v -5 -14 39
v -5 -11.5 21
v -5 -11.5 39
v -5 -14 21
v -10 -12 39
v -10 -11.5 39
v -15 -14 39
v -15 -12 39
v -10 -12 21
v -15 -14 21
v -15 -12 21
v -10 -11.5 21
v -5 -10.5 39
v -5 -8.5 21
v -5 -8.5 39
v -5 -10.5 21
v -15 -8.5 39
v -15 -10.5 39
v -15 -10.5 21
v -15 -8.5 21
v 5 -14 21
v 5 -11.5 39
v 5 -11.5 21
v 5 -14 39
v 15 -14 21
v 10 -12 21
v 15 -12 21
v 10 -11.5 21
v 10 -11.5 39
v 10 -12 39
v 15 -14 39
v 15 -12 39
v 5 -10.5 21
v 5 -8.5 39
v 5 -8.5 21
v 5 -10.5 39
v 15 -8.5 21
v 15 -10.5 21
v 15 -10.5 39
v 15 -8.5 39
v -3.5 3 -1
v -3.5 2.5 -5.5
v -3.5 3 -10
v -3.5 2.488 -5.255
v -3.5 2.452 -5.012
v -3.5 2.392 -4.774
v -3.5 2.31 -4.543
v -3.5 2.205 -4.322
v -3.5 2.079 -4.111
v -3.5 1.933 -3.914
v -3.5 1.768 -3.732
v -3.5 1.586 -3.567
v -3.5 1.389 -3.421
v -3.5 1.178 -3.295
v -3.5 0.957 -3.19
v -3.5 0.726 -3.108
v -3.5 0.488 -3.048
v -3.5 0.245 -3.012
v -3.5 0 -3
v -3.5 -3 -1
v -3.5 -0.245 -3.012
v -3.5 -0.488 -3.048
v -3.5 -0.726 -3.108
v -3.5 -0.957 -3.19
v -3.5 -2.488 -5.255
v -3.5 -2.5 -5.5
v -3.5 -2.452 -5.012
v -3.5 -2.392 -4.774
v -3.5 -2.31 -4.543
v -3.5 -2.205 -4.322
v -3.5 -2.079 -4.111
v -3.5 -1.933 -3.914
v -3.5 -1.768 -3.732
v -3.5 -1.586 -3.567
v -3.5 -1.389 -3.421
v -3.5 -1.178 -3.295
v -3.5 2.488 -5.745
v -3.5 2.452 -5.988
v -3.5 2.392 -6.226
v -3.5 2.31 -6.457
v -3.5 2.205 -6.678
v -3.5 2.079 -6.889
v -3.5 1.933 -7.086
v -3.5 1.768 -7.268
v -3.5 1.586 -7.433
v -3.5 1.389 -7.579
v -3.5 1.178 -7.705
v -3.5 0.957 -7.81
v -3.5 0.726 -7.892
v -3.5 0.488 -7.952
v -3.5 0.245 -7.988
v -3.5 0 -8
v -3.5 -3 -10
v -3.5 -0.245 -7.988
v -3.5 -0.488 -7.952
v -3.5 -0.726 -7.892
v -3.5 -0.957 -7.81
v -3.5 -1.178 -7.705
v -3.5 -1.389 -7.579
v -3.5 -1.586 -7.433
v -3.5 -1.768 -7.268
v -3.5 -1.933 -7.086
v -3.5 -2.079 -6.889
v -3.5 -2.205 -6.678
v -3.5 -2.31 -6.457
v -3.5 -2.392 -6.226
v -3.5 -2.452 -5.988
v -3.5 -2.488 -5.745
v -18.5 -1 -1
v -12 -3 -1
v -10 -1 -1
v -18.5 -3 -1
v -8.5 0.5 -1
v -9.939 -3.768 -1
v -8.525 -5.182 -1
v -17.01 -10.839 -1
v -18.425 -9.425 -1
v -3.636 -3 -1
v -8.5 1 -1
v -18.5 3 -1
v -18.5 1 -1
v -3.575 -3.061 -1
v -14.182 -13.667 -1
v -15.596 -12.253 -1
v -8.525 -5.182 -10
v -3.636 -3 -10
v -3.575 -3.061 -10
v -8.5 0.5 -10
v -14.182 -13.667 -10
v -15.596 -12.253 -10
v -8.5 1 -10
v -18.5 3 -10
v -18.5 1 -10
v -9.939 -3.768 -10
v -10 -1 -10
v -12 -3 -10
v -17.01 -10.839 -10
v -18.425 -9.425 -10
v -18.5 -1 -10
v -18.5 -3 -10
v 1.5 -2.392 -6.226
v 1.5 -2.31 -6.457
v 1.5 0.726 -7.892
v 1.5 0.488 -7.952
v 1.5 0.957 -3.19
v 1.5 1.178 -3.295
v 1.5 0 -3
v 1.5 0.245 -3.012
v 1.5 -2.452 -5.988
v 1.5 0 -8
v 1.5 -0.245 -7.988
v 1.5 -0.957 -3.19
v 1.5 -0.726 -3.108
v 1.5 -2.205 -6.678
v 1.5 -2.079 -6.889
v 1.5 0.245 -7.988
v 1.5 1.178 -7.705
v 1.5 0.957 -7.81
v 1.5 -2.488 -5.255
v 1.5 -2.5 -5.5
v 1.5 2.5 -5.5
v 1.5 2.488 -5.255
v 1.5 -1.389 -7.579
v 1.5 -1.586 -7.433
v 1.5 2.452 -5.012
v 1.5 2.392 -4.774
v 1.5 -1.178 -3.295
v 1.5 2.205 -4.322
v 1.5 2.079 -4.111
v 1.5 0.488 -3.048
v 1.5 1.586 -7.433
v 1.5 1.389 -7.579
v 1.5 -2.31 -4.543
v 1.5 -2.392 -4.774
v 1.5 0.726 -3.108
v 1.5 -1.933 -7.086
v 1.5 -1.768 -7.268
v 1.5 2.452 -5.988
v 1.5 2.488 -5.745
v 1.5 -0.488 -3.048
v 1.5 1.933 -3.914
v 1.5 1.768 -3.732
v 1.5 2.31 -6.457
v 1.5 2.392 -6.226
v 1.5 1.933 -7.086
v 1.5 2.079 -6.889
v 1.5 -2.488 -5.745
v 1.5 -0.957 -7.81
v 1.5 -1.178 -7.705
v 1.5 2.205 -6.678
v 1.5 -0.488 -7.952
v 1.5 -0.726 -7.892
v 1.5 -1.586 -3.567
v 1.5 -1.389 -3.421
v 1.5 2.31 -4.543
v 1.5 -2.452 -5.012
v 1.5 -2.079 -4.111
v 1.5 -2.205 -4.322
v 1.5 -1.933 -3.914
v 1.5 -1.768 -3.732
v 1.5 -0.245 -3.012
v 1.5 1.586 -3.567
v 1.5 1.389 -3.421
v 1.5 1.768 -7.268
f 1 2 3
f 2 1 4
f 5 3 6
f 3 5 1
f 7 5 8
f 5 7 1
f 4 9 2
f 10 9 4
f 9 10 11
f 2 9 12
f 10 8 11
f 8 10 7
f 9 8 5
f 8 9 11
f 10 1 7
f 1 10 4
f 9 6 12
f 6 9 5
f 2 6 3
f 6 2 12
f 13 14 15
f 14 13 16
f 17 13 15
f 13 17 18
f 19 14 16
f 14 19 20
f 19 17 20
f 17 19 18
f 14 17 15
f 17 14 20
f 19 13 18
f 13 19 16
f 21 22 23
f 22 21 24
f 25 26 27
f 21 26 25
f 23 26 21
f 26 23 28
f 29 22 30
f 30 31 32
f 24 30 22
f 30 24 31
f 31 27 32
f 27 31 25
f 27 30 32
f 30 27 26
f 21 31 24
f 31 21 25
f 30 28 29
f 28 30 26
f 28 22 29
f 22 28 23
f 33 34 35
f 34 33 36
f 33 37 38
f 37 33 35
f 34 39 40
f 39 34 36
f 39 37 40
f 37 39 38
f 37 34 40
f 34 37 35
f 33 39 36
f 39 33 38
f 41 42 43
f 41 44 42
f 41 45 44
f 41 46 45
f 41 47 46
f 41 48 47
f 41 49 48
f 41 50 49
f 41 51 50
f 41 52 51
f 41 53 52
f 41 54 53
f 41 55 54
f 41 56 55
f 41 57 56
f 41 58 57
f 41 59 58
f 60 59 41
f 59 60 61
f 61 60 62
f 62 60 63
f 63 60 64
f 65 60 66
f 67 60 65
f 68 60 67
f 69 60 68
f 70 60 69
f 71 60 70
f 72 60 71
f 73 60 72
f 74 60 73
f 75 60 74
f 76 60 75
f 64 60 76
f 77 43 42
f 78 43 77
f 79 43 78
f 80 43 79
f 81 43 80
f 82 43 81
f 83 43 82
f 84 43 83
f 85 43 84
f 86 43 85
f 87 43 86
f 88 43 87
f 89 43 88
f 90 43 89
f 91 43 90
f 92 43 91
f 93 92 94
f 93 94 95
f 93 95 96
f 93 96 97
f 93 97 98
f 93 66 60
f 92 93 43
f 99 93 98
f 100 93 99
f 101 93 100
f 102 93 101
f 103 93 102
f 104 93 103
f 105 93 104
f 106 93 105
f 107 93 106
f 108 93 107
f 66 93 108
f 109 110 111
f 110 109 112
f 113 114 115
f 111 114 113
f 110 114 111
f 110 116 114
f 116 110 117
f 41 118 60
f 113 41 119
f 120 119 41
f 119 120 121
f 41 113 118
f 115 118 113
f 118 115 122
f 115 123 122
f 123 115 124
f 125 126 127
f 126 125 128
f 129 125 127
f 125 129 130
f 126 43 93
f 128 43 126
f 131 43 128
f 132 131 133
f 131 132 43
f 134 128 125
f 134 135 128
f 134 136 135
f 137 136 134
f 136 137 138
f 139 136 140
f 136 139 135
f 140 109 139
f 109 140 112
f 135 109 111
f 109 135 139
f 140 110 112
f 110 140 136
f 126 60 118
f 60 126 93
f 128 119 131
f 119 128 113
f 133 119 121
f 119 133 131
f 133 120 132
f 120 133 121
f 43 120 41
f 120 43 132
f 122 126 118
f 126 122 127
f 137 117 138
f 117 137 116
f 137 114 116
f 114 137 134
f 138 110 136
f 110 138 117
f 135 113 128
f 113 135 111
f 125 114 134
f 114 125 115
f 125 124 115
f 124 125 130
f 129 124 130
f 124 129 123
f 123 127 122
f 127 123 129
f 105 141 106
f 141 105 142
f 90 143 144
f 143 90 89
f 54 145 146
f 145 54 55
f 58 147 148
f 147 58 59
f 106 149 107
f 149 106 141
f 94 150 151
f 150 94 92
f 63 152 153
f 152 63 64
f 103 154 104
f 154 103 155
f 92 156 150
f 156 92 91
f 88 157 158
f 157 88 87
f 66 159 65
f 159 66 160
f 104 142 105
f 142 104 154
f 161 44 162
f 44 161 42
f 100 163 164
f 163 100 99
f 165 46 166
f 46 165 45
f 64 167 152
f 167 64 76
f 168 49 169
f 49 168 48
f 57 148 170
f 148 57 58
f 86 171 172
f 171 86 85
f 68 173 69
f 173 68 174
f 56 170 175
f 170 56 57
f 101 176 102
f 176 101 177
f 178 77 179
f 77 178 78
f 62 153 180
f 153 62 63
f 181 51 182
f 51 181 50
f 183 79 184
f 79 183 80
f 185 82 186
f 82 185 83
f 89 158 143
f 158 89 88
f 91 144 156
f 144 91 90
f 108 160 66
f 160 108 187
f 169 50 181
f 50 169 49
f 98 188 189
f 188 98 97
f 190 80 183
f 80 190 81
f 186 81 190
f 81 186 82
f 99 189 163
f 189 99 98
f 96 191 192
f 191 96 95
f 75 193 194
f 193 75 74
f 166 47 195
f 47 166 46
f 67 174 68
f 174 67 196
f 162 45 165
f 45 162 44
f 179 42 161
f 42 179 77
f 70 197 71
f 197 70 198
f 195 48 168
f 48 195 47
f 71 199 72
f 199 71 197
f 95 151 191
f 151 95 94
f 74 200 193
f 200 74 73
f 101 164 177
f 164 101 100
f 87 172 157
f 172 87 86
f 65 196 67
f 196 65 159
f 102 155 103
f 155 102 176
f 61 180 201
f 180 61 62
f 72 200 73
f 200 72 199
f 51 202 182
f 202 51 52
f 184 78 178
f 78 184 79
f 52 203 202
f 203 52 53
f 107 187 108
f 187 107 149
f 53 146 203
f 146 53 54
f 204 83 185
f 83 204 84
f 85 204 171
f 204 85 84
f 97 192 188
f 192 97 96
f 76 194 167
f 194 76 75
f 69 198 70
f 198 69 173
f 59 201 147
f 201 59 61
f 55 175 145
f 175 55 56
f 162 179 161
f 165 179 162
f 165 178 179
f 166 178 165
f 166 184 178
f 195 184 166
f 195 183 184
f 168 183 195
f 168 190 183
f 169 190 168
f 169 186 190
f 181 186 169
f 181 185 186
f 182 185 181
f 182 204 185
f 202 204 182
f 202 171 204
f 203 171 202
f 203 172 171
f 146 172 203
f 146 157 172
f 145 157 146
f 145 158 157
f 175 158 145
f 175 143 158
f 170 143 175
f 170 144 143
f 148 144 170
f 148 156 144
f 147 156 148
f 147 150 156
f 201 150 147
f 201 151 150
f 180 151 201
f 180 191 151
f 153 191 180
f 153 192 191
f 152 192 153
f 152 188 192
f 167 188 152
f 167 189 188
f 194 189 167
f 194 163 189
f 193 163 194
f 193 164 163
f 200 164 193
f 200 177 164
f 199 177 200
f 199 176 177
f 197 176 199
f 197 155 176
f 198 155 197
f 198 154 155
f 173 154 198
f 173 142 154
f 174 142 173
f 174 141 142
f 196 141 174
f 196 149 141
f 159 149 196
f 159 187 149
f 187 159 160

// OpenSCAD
//difference(){
$fn = 64;


translate([-10,-13,30]) {
            rotate([0, 0, 0]){
                cube([10,2,18], true);
                translate([2.5,1,0]) cube([5,1,18], true);
                translate([0,3.5,0]) cube([10,2,18], true);
            }
        }
        
        translate([10,-13,30]) {
            rotate([0, 180, 0]){
                cube([10,2,18], true);
                translate([2.5,1,0]) cube([5,1,18], true);
                translate([0,3.5,0]) cube([10,2,18], true);
            }
        }



translate([-11,-2,-5.5]){
    translate([0, 0, 0]) {
        cube([15,2,9], true);
        translate([5,2,0]) cube([5,2,9], true);
        translate([0,4,0]) cube([15,,2,9], true);
    }
    
    rotate([180, 0, 45]) translate([-3, 1, 0]) {
        cube([15,2,9], true);
        translate([5,2,0]) cube([5,2,9], true);
        translate([0,4,0]) cube([15,,2,9], true);
    }
    
    difference(){
        rotate([0, 90, 0]) translate([0, 2, 10]) cylinder(5, d = 5, center = true);
        
    }
}
